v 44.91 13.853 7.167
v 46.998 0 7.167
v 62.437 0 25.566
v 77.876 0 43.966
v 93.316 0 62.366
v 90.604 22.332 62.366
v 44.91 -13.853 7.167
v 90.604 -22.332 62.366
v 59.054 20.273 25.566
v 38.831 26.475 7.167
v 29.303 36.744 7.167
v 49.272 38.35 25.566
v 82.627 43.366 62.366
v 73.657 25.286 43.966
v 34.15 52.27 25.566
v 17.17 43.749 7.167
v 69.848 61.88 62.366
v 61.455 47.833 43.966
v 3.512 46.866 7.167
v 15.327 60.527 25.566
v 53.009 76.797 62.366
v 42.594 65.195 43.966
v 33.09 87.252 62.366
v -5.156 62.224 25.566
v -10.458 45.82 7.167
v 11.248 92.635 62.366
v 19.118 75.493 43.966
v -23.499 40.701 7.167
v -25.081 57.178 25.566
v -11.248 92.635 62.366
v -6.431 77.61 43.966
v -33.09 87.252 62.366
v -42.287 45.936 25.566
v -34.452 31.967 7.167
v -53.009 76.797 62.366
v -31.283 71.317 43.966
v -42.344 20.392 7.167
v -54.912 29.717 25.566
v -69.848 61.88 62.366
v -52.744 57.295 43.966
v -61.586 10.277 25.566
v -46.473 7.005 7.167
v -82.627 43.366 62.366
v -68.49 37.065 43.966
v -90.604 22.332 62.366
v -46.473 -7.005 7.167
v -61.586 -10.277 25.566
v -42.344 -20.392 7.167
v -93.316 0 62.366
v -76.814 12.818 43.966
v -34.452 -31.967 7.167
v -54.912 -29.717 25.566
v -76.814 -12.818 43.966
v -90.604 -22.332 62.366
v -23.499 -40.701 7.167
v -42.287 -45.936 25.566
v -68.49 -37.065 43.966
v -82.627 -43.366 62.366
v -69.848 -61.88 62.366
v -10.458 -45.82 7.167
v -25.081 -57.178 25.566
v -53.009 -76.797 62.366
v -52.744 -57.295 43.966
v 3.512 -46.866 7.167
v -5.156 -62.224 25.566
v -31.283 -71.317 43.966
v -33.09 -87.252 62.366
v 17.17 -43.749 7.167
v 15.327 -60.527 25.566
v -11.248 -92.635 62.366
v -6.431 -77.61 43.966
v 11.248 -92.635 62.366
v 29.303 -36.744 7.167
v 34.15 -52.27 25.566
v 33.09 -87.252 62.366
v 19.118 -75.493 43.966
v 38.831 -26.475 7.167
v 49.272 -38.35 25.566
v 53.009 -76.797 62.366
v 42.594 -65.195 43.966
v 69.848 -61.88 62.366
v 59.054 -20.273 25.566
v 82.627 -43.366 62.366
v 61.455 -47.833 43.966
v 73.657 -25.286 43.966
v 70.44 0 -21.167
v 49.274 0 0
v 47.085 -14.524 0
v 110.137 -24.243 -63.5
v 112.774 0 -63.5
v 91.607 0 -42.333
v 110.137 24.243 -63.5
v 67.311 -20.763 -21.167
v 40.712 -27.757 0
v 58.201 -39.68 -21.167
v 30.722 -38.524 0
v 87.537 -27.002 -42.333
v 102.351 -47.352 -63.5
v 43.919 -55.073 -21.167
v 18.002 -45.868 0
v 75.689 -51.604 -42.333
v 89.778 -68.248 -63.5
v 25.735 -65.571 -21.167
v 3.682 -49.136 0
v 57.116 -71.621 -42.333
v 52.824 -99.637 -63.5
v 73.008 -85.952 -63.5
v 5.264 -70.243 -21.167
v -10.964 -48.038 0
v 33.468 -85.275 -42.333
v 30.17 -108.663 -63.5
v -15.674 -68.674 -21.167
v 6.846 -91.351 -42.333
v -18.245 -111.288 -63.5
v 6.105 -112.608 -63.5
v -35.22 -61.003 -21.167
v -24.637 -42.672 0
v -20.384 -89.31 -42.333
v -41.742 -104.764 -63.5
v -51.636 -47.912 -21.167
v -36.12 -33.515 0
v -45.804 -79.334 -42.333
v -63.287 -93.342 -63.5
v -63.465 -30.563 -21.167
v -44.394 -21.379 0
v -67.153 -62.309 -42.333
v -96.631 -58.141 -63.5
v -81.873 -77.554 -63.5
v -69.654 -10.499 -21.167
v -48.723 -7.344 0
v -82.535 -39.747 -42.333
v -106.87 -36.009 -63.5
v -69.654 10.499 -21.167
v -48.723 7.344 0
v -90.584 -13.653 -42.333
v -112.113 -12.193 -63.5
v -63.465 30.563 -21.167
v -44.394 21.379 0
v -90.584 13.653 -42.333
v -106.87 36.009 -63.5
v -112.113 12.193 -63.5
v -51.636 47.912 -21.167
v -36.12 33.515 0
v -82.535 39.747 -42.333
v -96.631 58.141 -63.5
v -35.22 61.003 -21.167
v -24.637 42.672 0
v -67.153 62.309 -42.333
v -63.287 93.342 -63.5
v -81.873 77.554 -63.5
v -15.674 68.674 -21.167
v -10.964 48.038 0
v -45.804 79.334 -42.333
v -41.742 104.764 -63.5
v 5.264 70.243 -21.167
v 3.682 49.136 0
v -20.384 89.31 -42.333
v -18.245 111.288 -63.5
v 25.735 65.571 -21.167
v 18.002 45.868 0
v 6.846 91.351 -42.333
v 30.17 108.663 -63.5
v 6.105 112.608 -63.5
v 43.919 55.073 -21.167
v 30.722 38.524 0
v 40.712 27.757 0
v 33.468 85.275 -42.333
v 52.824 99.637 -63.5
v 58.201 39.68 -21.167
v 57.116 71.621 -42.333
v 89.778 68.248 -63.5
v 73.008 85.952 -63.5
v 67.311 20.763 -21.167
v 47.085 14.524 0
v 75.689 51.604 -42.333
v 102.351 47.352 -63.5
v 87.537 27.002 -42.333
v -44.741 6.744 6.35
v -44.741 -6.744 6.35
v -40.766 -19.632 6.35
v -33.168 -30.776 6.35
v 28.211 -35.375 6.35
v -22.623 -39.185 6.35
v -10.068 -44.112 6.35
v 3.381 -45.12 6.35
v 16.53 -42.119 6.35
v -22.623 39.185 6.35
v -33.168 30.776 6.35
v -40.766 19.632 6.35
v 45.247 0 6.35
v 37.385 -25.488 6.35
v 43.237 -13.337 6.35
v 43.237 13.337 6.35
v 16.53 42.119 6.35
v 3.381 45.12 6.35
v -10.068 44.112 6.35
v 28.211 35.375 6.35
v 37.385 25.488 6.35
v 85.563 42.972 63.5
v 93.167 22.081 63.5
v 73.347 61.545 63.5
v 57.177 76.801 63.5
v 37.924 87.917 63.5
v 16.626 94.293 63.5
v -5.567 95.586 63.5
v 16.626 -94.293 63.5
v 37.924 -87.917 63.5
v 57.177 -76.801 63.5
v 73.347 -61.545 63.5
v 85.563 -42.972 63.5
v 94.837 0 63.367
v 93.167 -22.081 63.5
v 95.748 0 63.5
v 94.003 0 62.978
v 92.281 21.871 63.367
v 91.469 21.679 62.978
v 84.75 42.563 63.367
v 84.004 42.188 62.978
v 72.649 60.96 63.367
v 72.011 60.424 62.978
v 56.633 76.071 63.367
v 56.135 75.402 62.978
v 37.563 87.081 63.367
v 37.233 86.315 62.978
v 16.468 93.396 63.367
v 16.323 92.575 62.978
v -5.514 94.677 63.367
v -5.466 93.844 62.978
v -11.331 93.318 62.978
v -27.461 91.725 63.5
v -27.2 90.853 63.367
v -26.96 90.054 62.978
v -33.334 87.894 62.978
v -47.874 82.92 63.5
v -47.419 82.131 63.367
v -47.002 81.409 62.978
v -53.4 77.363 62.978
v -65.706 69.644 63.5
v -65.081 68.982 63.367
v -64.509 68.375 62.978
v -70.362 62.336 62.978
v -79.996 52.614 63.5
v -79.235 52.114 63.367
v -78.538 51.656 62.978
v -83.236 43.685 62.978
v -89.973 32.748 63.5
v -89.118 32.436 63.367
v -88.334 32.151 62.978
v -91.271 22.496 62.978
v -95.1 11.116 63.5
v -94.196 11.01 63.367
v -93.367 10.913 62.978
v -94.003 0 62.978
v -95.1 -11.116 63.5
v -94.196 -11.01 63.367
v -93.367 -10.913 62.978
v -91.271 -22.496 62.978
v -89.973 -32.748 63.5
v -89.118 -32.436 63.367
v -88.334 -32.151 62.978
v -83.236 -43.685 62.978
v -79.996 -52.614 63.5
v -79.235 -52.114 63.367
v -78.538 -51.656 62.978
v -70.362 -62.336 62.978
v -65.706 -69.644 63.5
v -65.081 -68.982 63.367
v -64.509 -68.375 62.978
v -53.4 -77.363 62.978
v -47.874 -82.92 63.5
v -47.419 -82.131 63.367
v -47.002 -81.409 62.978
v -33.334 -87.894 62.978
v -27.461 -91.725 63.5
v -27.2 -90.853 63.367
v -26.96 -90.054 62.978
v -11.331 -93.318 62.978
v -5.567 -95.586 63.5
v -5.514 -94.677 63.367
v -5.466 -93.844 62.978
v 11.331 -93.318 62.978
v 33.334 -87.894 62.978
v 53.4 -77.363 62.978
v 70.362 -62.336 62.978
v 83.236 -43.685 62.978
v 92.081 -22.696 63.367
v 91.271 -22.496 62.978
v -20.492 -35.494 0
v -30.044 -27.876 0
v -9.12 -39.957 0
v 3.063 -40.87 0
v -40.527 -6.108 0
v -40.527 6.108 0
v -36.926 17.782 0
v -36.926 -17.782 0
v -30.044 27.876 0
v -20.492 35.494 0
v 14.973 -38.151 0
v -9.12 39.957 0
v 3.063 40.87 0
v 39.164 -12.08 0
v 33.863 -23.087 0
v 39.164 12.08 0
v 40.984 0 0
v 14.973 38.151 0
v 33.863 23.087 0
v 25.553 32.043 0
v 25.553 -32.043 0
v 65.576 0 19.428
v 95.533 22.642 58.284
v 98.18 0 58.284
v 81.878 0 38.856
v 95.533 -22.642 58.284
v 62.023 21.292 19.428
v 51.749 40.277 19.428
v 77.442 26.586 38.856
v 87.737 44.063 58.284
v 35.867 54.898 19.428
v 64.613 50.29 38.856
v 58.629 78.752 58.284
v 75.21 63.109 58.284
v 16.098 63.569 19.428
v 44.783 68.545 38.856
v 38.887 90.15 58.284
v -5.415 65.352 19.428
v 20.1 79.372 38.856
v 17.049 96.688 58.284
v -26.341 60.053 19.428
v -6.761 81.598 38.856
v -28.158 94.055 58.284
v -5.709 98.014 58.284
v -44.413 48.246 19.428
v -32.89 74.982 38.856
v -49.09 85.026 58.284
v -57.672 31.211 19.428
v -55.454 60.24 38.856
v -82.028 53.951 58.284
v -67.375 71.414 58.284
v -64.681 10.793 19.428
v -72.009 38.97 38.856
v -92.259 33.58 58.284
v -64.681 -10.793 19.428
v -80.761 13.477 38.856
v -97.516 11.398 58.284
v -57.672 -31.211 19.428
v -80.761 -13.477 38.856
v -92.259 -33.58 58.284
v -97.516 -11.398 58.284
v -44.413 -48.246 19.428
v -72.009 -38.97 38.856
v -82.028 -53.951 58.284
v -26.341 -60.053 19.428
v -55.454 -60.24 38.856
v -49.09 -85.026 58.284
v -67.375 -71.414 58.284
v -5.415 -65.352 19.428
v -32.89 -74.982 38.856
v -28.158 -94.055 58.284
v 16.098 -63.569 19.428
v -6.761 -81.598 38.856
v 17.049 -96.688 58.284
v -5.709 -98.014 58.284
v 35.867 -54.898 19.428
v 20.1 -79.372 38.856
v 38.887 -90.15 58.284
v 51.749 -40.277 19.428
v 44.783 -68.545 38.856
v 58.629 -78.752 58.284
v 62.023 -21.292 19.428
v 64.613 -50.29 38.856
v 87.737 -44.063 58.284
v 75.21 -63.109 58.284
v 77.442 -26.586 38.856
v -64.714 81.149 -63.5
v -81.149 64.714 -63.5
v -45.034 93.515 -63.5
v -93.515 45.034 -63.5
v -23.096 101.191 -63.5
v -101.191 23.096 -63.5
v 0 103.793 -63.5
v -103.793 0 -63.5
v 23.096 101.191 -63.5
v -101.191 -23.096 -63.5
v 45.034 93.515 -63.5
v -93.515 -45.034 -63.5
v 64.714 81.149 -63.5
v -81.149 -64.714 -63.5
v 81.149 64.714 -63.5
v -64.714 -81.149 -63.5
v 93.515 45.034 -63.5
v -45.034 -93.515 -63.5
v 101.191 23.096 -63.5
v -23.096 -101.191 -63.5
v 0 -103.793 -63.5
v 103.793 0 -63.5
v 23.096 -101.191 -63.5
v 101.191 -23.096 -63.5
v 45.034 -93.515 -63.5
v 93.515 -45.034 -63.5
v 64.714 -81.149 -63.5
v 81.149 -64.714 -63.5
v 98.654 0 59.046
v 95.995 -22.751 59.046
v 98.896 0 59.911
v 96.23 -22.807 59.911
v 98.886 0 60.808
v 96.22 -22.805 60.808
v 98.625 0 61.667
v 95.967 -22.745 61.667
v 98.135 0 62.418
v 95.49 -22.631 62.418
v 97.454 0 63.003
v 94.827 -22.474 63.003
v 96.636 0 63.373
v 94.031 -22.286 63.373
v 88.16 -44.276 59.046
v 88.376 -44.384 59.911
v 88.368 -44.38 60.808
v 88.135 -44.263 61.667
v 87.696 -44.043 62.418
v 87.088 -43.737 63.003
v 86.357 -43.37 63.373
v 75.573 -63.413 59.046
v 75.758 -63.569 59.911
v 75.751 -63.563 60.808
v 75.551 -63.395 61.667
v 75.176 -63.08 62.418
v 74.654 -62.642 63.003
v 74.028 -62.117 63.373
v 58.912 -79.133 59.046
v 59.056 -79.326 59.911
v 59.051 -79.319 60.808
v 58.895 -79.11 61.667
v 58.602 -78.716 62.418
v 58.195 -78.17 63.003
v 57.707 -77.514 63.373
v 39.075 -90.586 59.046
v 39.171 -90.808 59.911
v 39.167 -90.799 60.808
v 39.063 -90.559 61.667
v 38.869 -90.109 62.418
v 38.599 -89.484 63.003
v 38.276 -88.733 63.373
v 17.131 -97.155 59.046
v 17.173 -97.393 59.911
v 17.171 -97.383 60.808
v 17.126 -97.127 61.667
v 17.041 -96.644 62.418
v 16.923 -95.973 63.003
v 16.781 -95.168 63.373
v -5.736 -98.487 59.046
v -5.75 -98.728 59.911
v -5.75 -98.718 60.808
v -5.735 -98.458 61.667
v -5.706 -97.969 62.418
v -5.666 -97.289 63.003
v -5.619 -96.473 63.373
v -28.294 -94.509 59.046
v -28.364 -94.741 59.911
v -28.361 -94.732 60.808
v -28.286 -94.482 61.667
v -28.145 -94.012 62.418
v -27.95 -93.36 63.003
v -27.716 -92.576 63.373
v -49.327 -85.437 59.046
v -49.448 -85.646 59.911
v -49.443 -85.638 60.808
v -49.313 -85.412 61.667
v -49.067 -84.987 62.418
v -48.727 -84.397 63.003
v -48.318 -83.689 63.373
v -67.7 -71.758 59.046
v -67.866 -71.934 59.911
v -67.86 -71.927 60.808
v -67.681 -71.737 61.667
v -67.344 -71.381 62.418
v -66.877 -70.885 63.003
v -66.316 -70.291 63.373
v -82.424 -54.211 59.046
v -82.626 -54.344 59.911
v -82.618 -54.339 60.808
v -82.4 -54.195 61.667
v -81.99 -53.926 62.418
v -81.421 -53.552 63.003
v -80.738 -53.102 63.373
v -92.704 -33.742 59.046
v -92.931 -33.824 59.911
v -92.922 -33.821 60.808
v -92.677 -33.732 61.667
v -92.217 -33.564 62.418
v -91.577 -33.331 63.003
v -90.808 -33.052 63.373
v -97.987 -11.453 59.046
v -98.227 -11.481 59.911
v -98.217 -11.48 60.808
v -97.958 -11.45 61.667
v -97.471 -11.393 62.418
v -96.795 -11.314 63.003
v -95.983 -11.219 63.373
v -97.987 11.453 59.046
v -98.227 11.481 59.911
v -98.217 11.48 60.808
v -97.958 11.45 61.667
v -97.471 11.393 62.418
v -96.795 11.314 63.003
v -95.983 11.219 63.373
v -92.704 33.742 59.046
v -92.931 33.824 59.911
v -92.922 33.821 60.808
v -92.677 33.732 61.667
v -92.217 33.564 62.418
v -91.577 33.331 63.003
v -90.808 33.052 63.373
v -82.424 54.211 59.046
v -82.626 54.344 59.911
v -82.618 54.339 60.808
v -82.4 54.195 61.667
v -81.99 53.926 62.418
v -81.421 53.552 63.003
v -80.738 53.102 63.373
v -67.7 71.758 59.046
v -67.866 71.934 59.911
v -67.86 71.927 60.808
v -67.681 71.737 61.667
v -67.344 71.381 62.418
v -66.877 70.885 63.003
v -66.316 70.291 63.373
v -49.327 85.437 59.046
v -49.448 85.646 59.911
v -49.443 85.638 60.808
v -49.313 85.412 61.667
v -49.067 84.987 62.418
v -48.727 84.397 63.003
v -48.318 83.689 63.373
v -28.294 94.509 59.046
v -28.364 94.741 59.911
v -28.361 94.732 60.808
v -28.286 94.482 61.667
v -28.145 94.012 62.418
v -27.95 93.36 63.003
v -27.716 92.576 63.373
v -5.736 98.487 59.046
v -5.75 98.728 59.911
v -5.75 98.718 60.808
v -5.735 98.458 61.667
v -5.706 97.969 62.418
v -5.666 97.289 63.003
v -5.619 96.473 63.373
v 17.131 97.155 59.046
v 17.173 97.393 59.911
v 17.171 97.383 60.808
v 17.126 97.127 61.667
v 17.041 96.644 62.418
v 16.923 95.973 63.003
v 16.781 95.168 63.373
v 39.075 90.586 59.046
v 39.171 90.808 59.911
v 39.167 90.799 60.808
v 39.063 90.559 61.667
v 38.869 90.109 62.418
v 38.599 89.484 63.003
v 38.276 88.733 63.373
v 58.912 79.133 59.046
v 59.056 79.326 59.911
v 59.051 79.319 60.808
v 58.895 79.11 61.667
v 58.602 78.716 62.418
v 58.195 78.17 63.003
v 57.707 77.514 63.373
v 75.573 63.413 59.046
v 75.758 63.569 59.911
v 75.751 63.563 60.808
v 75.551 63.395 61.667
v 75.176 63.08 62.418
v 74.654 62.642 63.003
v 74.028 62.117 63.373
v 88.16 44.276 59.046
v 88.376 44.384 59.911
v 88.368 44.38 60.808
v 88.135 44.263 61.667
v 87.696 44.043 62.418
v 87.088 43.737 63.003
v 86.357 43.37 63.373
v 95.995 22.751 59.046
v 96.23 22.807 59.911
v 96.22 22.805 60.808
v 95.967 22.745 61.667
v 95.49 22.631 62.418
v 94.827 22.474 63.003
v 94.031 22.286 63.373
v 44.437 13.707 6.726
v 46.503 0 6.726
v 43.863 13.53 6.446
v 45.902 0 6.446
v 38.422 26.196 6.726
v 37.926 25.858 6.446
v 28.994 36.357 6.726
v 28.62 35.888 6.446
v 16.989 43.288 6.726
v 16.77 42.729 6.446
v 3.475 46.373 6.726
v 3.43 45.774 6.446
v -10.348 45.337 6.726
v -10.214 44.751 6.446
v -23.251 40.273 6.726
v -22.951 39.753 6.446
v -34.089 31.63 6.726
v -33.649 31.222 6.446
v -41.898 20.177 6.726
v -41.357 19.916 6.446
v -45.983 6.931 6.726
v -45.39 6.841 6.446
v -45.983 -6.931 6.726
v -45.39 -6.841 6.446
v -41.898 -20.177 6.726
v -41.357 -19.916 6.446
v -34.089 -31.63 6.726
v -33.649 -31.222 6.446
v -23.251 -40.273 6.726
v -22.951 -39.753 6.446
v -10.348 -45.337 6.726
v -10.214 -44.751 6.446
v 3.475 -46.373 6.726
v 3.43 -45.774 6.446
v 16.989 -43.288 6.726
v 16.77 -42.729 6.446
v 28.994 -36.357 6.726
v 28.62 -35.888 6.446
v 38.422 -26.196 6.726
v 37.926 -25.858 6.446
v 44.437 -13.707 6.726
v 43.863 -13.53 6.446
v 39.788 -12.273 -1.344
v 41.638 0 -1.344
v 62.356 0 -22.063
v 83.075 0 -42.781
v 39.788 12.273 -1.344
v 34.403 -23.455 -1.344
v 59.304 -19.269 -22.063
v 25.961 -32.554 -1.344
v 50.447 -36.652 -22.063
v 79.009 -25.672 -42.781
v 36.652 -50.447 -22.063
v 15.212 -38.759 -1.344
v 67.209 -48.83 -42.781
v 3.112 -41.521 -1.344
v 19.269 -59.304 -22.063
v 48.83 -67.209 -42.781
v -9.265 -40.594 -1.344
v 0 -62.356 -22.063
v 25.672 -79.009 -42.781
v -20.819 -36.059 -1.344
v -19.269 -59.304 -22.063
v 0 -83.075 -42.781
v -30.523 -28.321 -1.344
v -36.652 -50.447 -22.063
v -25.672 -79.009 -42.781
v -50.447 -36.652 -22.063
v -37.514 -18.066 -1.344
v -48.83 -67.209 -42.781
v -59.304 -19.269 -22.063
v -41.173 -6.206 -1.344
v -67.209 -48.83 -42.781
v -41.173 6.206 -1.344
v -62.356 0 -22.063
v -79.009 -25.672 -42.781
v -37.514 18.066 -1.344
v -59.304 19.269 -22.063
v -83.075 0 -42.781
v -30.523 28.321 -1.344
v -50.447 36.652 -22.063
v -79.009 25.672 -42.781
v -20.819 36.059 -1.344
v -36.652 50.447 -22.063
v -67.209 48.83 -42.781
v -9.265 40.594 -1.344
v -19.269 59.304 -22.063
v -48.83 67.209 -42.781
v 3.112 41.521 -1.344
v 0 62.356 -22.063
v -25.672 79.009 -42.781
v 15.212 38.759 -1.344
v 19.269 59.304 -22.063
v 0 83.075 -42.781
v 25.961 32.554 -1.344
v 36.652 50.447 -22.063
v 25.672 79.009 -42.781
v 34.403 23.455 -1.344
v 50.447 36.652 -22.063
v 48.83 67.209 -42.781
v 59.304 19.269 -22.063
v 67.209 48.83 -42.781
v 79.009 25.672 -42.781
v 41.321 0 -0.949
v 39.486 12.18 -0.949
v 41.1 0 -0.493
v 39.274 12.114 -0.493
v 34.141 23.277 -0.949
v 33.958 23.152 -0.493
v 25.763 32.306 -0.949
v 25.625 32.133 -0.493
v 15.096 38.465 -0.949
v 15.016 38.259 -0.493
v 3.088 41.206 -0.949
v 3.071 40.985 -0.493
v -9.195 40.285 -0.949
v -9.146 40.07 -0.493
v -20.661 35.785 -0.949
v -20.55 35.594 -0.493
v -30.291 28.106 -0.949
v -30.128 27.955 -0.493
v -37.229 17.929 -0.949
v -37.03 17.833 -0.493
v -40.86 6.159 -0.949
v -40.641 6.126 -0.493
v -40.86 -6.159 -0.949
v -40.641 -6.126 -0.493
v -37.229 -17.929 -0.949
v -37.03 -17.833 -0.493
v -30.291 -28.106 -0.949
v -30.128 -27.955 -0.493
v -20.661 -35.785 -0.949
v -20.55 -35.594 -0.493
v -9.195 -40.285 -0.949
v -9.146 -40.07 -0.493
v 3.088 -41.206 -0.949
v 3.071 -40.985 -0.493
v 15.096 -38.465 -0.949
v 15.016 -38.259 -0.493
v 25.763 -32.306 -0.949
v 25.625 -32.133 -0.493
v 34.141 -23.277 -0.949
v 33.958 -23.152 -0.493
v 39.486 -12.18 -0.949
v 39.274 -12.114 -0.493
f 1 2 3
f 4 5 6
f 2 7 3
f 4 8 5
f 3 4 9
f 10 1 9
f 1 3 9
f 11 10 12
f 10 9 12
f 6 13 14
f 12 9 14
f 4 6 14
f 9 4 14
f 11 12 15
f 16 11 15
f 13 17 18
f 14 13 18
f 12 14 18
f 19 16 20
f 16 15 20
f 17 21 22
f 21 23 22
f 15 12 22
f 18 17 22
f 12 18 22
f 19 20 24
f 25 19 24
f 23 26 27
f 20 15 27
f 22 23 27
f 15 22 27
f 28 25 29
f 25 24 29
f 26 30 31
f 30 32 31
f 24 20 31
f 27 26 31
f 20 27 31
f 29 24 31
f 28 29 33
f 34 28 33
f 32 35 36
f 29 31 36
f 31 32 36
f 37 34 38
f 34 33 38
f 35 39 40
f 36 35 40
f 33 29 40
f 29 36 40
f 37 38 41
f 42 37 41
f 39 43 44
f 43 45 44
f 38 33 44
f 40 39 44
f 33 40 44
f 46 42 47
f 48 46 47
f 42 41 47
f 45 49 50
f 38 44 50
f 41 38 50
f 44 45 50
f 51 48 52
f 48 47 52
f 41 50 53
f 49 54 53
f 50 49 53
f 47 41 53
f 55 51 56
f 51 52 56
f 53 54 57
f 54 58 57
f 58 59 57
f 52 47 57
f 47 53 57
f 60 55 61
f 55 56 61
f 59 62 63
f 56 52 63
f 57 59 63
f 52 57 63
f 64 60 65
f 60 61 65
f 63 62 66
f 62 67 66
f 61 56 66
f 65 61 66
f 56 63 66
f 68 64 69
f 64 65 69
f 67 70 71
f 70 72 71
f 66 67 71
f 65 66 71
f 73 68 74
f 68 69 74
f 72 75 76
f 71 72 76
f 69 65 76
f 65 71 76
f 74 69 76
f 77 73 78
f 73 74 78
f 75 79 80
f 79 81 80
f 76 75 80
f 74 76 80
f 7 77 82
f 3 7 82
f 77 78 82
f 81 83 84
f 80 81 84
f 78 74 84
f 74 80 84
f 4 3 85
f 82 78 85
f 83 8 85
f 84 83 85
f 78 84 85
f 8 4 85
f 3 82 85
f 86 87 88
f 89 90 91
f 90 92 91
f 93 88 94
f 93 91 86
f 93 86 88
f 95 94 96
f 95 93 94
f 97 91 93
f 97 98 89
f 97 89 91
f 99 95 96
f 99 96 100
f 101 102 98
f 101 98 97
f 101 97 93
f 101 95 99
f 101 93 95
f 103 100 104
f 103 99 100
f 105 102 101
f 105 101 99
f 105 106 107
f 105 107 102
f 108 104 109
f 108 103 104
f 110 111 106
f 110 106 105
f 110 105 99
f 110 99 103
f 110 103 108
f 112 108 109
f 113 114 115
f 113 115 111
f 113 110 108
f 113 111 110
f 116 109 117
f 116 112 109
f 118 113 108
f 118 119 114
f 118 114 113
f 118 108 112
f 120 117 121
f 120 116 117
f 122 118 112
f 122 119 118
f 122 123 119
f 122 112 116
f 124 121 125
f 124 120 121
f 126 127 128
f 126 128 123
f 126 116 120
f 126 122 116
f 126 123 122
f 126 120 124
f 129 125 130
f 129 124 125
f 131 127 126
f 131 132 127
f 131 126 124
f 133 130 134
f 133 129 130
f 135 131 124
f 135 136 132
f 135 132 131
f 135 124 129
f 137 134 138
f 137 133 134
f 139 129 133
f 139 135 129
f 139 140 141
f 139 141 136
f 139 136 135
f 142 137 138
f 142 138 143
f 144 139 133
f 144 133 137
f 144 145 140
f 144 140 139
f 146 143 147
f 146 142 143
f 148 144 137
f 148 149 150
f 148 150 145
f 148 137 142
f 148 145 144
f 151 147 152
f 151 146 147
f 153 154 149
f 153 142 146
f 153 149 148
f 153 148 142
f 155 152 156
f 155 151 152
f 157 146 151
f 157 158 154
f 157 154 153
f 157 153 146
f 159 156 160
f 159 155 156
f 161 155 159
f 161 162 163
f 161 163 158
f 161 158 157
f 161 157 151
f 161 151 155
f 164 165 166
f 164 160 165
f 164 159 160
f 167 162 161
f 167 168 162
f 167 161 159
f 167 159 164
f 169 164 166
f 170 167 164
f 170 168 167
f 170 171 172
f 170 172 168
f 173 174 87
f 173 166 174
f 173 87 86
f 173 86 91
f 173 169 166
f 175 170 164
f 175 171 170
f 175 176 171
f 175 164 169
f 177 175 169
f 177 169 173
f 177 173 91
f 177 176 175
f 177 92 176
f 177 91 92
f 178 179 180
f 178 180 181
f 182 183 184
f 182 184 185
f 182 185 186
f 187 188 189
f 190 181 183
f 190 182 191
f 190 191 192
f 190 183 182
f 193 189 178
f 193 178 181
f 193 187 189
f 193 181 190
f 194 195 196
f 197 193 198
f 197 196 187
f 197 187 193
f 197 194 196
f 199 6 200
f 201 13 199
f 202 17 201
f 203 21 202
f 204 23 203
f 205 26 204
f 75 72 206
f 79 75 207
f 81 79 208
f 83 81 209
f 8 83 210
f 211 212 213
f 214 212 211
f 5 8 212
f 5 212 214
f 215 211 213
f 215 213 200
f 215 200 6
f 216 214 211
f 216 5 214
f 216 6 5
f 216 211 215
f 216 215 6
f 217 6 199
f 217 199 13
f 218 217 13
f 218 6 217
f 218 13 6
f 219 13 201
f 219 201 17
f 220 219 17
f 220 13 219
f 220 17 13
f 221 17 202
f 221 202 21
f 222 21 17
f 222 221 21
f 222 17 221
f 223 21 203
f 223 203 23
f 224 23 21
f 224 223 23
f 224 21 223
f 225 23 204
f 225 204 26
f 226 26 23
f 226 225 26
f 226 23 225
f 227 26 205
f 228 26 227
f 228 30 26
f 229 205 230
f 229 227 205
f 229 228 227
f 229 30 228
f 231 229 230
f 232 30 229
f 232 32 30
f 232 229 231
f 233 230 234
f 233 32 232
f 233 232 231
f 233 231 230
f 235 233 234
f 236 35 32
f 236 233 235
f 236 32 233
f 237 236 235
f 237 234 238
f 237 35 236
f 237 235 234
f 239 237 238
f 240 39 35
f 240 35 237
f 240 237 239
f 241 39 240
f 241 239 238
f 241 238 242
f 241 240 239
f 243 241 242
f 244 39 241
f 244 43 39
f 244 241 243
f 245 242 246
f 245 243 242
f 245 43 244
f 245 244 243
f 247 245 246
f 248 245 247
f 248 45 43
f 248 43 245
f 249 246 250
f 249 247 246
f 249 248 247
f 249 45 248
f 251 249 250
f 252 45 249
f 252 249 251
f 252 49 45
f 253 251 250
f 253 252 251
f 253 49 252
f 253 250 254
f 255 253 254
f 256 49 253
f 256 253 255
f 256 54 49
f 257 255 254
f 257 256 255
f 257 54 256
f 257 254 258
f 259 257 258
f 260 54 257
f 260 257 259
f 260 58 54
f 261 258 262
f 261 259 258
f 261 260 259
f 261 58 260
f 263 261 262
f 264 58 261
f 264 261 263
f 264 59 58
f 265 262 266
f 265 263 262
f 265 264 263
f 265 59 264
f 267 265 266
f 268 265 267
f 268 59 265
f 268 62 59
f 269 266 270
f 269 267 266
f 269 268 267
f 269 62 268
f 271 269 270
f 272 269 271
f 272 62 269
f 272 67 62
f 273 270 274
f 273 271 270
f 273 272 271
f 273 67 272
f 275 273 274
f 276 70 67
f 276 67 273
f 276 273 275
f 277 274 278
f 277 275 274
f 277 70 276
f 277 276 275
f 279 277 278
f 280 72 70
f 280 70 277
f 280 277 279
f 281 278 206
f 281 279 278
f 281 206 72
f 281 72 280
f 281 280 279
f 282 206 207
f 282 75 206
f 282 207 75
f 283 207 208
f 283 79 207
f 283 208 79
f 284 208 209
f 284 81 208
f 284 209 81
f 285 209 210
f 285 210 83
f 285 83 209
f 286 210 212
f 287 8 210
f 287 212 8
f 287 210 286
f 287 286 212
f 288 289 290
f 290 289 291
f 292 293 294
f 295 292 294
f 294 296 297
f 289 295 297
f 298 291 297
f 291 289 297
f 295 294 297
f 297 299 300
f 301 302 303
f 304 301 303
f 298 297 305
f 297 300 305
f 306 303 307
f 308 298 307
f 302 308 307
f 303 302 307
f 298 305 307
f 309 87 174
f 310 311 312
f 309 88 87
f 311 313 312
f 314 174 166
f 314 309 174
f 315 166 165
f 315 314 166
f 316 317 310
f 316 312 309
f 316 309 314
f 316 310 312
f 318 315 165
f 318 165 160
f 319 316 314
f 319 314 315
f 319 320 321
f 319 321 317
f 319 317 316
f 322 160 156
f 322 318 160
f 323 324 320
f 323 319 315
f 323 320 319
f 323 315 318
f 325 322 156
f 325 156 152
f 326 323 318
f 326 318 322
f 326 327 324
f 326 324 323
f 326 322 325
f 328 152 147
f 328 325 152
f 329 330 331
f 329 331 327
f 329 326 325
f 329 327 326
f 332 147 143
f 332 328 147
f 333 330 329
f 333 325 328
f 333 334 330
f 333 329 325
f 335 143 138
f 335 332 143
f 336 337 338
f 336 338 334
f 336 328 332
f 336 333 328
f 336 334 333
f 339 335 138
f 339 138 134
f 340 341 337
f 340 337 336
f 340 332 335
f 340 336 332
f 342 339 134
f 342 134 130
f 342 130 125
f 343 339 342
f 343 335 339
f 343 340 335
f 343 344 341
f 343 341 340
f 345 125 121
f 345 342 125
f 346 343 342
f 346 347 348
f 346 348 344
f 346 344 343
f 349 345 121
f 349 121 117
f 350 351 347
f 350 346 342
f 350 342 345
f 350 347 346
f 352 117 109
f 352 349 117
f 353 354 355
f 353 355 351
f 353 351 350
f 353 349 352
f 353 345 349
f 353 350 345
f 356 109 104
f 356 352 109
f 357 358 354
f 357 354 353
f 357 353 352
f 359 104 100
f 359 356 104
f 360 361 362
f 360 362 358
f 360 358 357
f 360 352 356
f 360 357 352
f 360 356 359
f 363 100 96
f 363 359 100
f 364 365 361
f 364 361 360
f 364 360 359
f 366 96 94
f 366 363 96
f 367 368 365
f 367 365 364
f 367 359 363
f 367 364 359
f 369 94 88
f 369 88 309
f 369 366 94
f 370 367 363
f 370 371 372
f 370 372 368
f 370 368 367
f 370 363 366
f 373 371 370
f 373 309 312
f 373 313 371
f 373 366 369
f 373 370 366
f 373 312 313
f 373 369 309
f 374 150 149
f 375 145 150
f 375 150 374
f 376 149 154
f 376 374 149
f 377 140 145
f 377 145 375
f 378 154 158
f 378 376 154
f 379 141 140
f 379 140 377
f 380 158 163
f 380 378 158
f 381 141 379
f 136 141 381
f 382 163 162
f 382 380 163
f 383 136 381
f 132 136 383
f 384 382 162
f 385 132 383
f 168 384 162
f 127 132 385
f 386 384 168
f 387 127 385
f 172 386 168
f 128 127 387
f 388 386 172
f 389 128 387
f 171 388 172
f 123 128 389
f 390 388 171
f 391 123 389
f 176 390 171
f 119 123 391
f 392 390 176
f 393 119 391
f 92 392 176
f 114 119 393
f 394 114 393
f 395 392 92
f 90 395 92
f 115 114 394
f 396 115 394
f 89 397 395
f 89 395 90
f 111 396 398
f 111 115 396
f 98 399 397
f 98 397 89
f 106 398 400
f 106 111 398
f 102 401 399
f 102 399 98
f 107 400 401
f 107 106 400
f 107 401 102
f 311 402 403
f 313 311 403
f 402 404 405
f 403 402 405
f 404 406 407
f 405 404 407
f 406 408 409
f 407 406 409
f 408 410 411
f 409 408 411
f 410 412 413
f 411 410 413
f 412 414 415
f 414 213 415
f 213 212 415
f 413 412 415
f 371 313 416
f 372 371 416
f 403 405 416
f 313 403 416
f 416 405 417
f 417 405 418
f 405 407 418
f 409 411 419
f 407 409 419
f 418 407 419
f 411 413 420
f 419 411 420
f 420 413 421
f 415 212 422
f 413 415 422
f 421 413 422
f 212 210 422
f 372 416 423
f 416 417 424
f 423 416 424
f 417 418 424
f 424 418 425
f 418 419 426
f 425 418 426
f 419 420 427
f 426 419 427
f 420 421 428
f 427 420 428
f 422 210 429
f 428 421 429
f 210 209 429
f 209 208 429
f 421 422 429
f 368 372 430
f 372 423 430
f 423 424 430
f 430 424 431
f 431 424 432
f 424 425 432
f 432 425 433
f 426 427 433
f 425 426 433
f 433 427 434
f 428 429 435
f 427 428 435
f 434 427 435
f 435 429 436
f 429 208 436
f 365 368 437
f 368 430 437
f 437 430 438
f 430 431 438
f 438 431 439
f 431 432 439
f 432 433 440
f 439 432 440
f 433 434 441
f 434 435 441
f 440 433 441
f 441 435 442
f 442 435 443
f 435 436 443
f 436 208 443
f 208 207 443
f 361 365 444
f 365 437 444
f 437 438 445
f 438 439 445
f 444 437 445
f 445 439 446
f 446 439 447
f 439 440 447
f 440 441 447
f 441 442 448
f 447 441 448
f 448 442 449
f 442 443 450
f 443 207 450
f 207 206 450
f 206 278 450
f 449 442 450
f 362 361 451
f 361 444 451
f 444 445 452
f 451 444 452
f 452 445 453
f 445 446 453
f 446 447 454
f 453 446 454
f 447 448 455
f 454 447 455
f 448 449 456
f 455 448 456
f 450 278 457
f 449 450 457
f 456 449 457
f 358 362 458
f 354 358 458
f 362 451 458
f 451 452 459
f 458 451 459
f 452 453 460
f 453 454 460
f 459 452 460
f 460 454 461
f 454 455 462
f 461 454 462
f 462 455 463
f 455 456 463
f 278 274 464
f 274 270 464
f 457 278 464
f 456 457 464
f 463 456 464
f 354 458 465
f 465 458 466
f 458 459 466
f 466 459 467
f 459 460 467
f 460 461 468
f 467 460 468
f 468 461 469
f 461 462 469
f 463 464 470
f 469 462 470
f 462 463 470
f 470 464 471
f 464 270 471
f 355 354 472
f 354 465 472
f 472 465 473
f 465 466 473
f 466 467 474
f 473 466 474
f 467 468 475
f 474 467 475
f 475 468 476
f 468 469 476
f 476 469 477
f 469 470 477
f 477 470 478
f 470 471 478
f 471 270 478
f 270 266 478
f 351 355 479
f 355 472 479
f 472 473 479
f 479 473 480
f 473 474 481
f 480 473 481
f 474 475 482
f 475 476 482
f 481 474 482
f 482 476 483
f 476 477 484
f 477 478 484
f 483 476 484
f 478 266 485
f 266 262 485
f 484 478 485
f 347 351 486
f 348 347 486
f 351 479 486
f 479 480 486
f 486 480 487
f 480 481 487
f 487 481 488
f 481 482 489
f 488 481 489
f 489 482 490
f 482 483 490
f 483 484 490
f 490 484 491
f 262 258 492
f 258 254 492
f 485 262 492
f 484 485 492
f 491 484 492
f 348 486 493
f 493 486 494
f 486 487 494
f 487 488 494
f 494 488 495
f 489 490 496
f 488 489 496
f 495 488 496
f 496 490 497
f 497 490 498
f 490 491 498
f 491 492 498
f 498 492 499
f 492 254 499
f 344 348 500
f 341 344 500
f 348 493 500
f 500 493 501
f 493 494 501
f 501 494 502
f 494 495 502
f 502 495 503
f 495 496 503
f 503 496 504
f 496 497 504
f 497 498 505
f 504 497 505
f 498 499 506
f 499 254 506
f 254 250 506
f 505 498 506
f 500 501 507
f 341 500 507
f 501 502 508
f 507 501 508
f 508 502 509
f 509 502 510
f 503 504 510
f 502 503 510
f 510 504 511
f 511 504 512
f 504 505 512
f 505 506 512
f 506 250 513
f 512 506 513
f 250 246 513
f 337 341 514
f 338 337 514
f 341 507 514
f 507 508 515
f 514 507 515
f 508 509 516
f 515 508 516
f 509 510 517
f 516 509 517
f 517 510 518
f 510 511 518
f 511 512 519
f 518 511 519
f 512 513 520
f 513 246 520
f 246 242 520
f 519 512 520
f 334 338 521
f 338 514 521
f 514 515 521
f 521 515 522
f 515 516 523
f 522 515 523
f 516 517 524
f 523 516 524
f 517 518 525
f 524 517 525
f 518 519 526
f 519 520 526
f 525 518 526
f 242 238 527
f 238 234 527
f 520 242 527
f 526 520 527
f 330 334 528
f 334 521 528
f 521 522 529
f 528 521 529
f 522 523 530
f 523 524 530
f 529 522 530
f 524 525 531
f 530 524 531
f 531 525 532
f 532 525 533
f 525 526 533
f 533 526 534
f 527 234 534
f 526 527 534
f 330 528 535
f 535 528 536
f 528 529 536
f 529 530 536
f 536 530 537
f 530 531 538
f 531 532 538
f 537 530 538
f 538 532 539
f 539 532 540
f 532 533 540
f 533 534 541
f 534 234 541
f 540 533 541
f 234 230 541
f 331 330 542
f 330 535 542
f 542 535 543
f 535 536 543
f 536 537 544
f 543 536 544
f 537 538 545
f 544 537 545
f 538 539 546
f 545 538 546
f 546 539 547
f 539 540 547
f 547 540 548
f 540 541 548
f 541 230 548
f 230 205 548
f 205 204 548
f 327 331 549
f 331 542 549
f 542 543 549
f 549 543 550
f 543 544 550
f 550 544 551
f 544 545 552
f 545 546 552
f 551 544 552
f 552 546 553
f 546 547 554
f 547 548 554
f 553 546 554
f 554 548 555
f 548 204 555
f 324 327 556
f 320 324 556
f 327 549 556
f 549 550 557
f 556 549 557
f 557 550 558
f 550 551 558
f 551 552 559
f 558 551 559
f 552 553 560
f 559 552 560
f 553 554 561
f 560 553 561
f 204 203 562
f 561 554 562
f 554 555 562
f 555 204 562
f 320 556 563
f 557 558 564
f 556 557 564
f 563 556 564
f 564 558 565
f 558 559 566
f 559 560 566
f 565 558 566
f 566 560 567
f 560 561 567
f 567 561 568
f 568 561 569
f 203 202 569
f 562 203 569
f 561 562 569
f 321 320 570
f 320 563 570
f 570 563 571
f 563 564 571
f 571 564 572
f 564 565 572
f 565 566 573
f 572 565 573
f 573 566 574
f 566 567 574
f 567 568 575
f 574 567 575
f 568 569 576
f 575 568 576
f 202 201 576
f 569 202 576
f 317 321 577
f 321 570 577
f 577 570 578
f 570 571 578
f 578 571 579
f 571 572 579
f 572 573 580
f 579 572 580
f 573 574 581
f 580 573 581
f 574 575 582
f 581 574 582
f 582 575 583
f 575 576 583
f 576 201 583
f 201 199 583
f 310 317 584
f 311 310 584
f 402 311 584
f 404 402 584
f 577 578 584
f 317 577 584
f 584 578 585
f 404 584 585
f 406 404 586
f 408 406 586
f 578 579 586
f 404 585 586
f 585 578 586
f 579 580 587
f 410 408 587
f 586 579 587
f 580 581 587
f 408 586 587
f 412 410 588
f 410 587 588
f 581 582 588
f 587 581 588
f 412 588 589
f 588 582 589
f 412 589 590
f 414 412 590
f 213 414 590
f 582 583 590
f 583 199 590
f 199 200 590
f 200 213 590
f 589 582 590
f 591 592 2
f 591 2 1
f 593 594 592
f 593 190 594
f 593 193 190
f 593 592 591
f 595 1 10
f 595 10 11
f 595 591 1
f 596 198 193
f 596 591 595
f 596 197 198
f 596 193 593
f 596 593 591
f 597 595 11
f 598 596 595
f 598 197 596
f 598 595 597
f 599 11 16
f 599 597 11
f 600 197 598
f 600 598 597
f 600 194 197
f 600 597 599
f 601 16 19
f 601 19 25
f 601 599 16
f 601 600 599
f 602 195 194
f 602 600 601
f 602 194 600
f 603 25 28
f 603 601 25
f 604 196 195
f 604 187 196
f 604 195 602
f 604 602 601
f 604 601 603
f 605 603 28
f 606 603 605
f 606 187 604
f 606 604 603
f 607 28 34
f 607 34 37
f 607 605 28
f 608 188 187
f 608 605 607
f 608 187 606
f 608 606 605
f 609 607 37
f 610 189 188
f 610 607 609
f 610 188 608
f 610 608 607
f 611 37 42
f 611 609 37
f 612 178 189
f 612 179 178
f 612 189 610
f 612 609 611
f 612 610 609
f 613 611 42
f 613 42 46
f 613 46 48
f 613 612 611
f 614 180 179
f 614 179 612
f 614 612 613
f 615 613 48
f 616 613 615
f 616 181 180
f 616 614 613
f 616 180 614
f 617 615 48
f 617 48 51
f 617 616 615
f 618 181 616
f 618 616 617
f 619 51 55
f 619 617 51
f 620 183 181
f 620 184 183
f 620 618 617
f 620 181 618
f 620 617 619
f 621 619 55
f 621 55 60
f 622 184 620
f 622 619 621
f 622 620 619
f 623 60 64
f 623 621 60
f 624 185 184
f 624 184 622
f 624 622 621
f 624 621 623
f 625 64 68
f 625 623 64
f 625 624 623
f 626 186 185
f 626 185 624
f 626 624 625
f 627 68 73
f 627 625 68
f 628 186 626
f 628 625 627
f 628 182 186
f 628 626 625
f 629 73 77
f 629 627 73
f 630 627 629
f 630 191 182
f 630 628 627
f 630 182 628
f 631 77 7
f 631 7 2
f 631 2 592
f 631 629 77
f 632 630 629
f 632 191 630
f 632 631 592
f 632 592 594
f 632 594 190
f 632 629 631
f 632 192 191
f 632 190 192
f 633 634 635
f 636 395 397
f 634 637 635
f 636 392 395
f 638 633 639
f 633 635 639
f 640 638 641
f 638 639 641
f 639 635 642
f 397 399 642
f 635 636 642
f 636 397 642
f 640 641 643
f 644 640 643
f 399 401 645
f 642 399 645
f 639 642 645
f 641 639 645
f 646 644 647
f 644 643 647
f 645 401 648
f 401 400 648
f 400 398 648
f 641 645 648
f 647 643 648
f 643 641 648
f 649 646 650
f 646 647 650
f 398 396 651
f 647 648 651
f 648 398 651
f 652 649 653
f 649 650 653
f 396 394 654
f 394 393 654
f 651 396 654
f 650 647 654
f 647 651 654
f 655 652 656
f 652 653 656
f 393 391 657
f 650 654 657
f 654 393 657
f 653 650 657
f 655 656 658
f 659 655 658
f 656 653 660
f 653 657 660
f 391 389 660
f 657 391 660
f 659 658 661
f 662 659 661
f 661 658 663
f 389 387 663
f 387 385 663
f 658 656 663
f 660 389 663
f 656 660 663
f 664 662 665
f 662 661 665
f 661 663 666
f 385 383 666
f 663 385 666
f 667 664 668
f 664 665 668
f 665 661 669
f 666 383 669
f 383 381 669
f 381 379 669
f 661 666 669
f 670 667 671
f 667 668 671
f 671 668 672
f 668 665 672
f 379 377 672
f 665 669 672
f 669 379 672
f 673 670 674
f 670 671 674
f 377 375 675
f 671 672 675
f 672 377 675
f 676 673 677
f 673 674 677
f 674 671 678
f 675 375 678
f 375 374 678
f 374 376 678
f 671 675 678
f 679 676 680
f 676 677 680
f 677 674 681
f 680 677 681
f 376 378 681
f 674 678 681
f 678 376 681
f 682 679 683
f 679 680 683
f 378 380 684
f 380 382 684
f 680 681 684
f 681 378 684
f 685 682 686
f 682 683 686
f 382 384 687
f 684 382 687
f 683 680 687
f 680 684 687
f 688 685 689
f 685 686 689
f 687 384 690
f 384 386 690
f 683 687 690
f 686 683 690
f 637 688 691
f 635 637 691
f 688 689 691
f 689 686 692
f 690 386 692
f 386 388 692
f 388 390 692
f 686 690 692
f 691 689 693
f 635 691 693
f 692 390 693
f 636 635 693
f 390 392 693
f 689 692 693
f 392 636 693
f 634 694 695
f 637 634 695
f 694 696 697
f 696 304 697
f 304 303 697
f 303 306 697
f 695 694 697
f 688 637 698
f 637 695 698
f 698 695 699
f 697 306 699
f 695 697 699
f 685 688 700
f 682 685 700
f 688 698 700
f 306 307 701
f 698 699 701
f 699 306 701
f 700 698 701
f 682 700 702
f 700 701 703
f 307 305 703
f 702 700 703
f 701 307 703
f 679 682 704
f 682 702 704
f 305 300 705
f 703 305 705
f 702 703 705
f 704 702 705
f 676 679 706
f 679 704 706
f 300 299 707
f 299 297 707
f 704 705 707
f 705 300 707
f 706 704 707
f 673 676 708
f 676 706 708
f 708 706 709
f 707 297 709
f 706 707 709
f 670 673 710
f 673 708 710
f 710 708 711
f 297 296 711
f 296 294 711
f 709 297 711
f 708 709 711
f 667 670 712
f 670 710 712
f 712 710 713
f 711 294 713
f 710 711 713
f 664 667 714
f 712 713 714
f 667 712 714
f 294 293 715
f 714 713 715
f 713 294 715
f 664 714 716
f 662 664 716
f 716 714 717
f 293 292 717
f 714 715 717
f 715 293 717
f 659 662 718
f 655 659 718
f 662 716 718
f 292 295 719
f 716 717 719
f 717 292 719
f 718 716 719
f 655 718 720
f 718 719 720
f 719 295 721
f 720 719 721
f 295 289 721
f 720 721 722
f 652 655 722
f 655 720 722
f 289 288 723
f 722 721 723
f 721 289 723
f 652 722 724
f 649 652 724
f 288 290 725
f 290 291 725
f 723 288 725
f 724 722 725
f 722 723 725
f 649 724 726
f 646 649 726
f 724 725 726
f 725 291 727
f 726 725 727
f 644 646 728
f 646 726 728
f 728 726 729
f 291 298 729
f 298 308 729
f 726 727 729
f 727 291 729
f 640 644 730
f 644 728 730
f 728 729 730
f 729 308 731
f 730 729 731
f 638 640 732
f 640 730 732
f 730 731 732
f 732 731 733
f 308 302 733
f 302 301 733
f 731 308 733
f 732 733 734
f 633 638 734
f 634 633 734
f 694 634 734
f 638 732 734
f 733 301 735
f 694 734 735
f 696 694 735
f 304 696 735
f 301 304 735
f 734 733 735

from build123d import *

# Parameters (mm, degrees)
F0_R      = 49.2737208463
F1_DEPTH  = 63.5
F1_TAPER  = -40
F2_T      = -6.35
F3_R      = 3.17499
F1_FACE_R = 49.2737208463
F4_DEPTH  = 63.5
F4_TAPER  = -45
F5_T      = -6.35
F6_R      = 2.286


# Not quite as in the source:
# - a fillet or chamfer that OpenCascade refuses, or shapes differently, is made with other operations: its cross-section is extruded or revolved along the edge and cut away or added
# - a fillet or chamfer is up to 0.001 mm smaller than in the source, because OpenCascade refuses the exact size


with BuildPart() as f1:
    # F0 (on Top) → F1 (new body)
    with BuildSketch(Plane.XY):
        Circle(F0_R)
    extrude(amount=F1_DEPTH, taper=F1_TAPER)

    # F2
    f2_openings = [f1.faces().sort_by_distance(p)[0] for p in [
        (0, 0, 63.5),
    ]]
    offset(amount=F2_T, openings=f2_openings, kind=Kind.INTERSECTION)

    # F3 (radius 3.175 in the source; OpenCascade refuses exactly that, so slightly less here)
    f3_edges = [f1.edges().sort_by_distance(p)[0] for p in [
        (-102.556547, 0, 63.5),
        (-94.267211, 0, 63.5),
    ]]
    fillet(f3_edges, radius=F3_R)

    # F1_face (on face) → F4 (join)
    with BuildSketch(Plane(origin=(0, 0, 0), x_dir=(1, 0, 0), z_dir=(0, 0, -1))):
        Circle(F1_FACE_R)
    extrude(amount=F4_DEPTH, taper=F4_TAPER)

    # F5
    f5_openings = [f1.faces().sort_by_distance(p)[0] for p in [
        (0, 0, -63.5),
    ]]
    offset(amount=F5_T, openings=f5_openings, kind=Kind.INTERSECTION)

    # F6
    f6_edges = [f1.edges().sort_by_distance(p)[0] for p in [
        (-46.312667, 0, 6.35),
    ]]
    fillet(f6_edges, radius=F6_R)

    # F7: fillet of radius 2.286 on 1 edges, made by hand

    # F7_s1 → F7_t2 (revolve, cut)
    with BuildSketch(Plane.XZ):
        with BuildLine():
            ThreePointArc((41.6376699139, -1.3442051886), (41.1980722658, -0.7269988473), (40.984384559, 0))
            Line((40.984384559, 0), (40.6691484685, -0.3756837433))
            Line((40.6691484685, -0.3756837433), (41.6376699139, -1.3442051886))
        make_face()
    revolve(axis=Axis((0, 0, -0.3756837433), (0, 0, 1)), mode=Mode.SUBTRACT)


solid = f1.part
